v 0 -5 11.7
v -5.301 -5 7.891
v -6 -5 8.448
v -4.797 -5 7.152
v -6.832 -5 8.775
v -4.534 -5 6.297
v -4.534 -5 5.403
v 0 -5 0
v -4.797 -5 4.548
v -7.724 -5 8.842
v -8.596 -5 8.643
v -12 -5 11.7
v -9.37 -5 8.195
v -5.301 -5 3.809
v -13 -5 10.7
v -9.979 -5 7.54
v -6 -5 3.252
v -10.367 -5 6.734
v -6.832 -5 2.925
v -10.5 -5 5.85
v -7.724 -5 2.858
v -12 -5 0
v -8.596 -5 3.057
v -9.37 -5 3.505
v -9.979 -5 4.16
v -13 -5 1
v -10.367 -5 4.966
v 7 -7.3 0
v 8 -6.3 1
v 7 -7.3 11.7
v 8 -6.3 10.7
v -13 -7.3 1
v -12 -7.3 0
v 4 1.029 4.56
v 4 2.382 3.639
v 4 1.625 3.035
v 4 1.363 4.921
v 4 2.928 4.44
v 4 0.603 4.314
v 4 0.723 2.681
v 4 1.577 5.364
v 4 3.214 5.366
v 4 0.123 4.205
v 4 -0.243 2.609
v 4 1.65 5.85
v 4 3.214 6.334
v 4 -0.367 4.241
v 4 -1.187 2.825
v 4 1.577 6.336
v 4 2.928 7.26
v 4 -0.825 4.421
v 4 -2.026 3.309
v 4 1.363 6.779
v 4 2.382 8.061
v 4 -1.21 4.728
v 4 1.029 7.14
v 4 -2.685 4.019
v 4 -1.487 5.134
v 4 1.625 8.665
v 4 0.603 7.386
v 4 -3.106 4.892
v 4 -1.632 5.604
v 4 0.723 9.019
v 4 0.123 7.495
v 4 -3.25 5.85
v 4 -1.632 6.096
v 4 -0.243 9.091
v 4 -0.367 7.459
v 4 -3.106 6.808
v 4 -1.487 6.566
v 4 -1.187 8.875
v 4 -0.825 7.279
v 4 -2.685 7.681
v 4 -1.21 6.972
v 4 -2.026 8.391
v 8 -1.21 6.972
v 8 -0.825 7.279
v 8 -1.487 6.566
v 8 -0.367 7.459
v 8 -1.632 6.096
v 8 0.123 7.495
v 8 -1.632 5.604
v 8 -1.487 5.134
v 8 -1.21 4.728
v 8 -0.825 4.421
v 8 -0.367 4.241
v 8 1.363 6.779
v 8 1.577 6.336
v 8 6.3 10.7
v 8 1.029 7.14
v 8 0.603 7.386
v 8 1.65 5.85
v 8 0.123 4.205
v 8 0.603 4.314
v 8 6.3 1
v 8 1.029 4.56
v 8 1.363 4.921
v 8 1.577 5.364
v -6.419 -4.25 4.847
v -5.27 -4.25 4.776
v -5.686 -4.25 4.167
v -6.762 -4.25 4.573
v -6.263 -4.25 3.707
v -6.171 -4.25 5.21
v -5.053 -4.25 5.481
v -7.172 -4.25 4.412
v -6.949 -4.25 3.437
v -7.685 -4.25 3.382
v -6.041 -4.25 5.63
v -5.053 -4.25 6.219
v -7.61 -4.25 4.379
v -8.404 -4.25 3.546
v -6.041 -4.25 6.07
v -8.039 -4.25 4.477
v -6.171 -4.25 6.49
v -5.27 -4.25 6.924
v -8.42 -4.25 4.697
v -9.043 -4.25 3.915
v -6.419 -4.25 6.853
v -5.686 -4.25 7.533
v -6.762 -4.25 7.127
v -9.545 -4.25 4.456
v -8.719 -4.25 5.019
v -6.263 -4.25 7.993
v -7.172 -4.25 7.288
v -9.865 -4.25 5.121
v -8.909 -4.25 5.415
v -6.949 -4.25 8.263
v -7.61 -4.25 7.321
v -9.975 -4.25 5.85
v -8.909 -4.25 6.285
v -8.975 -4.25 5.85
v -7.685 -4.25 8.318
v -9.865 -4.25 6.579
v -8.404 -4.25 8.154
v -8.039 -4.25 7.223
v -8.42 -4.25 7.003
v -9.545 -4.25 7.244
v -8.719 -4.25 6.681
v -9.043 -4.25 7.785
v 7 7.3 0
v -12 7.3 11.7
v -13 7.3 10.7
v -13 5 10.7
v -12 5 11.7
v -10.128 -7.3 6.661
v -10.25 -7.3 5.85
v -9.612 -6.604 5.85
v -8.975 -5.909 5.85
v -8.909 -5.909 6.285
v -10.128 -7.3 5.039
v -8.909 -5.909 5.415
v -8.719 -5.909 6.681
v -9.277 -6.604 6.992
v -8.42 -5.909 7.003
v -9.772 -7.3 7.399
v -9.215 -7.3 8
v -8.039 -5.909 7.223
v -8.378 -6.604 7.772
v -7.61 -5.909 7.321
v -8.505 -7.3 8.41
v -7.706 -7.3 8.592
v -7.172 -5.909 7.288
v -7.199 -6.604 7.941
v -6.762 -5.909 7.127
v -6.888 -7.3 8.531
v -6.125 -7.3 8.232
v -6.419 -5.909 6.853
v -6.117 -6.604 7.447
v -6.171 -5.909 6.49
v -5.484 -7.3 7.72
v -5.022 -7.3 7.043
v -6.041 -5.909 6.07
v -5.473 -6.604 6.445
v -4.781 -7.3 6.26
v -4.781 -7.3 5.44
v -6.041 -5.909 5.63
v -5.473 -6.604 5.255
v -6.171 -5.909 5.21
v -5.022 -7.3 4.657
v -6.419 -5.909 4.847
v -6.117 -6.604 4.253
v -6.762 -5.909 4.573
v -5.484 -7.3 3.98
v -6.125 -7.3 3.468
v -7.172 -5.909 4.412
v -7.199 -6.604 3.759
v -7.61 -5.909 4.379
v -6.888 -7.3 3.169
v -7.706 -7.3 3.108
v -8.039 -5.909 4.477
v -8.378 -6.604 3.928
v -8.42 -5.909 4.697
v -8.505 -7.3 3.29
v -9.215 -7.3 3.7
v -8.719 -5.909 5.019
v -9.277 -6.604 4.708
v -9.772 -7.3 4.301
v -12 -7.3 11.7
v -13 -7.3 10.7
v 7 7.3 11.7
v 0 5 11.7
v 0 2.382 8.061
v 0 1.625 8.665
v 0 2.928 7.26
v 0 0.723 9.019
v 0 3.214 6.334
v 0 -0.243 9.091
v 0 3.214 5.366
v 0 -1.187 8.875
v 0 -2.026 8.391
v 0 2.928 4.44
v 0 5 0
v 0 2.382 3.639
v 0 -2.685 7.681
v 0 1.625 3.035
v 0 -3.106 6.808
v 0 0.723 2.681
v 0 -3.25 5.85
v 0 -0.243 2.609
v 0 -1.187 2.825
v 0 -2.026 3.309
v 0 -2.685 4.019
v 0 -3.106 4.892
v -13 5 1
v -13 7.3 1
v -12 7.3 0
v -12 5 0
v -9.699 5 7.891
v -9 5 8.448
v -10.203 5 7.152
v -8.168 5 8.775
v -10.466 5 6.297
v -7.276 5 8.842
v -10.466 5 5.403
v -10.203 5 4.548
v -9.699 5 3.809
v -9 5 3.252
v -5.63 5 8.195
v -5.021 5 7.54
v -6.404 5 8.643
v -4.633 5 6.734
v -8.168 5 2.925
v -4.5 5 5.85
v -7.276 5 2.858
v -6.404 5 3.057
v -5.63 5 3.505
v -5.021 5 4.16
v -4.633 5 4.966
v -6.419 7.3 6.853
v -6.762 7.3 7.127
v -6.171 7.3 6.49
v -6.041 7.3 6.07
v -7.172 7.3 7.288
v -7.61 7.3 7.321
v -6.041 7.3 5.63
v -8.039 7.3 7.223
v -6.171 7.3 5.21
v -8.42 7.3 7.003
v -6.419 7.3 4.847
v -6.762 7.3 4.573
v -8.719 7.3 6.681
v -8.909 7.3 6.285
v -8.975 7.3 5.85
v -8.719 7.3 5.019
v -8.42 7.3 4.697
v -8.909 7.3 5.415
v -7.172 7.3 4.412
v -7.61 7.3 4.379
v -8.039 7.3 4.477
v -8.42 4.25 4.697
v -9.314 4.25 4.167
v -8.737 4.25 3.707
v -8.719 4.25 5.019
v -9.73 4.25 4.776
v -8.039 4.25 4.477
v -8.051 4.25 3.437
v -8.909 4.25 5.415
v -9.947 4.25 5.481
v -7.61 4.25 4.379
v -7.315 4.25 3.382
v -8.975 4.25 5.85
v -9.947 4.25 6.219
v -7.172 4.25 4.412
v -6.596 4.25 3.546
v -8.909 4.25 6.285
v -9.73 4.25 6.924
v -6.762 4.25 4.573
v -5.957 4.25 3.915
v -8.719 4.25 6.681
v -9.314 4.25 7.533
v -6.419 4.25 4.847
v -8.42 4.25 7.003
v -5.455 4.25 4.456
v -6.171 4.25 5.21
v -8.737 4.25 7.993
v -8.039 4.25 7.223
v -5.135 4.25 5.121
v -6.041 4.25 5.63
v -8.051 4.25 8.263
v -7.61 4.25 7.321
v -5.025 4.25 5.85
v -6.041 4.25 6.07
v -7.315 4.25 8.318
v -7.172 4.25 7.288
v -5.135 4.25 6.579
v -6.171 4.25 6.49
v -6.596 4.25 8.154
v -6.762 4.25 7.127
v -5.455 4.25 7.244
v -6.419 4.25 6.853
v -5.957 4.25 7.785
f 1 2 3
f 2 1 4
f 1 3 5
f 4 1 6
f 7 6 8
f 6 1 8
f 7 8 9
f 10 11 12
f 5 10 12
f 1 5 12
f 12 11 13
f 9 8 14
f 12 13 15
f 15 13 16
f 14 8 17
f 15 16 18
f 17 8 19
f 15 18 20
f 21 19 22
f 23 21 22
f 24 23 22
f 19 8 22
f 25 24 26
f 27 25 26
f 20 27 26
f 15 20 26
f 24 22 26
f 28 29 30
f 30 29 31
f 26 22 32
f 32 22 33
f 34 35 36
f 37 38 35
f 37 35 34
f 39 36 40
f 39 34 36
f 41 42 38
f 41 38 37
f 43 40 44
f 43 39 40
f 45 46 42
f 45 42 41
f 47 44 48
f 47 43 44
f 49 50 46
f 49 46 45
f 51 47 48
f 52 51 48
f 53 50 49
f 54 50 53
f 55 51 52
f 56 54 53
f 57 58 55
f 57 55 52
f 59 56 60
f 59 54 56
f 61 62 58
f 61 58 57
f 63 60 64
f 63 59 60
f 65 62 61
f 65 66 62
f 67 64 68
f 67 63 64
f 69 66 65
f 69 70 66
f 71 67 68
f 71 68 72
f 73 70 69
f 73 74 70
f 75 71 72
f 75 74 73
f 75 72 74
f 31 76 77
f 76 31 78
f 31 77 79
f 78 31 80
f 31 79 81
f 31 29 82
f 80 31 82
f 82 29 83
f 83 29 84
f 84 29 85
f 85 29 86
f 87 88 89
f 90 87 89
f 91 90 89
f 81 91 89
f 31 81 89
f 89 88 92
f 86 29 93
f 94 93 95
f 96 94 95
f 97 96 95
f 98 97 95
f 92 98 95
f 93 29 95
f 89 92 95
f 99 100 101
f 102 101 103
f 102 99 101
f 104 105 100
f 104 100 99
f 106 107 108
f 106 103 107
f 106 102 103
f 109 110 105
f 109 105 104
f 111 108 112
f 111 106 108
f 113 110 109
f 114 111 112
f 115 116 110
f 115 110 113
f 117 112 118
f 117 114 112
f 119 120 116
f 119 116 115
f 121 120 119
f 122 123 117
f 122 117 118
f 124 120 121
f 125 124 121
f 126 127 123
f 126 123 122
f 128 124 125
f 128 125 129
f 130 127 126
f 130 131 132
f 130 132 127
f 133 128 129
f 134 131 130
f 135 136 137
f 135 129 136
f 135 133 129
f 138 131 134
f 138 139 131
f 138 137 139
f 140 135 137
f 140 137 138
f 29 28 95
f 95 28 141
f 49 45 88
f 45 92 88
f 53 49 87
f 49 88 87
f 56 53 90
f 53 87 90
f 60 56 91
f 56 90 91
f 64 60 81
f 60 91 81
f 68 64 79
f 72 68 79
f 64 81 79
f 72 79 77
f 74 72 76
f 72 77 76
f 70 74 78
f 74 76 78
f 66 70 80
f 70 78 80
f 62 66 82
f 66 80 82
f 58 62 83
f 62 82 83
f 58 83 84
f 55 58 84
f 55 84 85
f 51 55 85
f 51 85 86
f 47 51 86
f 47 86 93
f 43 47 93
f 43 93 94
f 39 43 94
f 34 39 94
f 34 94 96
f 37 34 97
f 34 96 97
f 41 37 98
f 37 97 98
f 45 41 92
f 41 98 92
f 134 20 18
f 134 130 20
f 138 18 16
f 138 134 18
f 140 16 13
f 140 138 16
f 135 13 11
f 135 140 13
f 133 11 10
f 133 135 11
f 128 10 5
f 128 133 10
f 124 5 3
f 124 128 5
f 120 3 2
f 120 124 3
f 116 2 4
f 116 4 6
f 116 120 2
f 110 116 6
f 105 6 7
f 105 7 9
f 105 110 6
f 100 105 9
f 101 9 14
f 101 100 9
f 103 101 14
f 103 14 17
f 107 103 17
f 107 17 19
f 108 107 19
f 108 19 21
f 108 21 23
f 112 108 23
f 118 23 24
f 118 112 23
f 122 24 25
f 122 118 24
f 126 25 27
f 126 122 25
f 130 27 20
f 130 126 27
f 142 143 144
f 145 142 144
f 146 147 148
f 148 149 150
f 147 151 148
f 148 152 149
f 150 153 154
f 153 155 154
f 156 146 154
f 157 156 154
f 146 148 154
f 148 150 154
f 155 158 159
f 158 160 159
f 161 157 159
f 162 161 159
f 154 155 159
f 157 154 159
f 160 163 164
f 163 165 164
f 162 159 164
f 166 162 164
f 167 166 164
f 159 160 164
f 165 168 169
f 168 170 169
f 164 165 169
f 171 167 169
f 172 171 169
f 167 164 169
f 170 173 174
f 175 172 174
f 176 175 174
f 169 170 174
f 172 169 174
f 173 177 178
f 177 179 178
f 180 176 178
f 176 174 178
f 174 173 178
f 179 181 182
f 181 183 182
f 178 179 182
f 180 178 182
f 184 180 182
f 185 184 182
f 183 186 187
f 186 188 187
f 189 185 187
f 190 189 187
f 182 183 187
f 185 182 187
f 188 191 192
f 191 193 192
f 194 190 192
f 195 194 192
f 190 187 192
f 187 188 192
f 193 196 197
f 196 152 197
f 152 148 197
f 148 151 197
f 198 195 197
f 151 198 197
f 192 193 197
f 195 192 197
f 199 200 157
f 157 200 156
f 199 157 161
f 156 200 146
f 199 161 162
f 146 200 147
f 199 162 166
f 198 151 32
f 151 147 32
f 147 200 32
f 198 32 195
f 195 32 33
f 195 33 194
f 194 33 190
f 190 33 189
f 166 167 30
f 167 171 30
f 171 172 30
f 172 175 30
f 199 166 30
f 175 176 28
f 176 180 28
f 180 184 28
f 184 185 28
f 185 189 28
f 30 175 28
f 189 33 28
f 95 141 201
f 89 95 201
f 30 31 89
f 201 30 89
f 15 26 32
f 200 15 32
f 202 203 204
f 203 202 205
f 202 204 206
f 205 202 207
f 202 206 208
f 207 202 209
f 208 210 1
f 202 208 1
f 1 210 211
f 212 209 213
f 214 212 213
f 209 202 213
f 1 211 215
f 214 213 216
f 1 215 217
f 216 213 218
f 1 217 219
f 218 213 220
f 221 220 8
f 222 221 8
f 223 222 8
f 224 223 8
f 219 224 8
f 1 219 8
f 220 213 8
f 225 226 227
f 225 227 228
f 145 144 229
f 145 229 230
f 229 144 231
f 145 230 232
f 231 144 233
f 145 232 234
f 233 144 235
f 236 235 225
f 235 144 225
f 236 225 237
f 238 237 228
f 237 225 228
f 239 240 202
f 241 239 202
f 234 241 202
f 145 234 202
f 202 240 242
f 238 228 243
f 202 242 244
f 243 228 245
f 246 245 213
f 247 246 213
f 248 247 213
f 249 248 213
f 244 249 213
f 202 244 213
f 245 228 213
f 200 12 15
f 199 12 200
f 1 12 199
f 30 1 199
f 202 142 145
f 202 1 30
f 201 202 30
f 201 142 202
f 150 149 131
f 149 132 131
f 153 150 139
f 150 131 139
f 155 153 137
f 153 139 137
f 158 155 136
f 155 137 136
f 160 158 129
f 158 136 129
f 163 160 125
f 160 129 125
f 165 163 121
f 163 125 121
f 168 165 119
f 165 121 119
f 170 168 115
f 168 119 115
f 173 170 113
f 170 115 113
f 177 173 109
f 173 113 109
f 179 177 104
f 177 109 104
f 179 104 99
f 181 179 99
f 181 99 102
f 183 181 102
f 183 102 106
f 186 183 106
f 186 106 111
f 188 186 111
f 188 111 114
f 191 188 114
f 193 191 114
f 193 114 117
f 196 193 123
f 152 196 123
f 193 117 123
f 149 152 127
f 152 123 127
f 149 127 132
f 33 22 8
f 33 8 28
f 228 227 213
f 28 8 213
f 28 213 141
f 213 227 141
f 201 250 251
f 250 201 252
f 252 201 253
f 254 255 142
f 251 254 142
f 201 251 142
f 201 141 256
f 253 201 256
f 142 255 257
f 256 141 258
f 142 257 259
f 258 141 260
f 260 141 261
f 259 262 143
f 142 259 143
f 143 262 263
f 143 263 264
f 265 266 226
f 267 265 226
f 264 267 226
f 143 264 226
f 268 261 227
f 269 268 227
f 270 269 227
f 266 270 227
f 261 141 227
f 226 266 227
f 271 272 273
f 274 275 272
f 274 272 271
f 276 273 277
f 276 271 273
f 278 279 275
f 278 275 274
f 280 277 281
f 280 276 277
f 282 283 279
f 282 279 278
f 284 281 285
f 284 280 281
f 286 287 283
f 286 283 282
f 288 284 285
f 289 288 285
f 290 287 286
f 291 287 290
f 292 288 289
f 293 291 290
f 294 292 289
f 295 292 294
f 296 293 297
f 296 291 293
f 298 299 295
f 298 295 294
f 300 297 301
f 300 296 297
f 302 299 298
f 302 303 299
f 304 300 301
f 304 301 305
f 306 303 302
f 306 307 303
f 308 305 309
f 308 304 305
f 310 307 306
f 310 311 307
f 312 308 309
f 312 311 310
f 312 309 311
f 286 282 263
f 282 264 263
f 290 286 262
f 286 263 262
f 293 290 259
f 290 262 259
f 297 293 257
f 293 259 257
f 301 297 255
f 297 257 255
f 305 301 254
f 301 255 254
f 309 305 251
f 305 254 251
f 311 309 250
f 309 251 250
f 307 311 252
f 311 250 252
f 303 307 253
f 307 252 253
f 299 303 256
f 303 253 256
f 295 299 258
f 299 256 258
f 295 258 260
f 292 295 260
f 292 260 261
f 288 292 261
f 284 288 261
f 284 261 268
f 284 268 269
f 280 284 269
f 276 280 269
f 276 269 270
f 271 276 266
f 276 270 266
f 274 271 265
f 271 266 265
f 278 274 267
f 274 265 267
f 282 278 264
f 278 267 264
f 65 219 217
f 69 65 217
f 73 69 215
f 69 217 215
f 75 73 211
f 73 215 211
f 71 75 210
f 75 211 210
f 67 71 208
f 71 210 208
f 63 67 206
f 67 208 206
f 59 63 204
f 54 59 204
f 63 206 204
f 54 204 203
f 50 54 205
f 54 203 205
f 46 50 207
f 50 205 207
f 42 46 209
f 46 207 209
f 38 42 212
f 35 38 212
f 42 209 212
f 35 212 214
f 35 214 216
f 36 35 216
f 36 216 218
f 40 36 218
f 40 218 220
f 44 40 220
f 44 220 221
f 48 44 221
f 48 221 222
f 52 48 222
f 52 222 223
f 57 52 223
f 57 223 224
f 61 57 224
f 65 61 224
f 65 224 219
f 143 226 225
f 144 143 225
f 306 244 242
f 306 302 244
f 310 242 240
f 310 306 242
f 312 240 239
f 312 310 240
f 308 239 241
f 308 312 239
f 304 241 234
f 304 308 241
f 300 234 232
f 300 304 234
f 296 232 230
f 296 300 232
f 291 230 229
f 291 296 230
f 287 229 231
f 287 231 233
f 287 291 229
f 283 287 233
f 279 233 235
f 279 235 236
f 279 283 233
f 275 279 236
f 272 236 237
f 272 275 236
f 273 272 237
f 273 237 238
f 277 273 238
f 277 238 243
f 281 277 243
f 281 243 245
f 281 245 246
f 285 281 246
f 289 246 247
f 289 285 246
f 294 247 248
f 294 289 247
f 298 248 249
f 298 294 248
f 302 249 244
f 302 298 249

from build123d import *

# Parameters (mm, degrees)
F1_DEPTH       = 11.7
F4_R           = 3
F6_DEPTH       = 0.75
F6_TAPER       = 35
F5_R           = 3
F7_DEPTH       = 0.75
F7_TAPER       = 35
F8_D           = 2.95
F8_CSINK_D     = 5.5
F8_CSINK_ANGLE = 85
F9_D           = 3.3
F9_CBORE_D     = 6.5
F9_CBORE_DEPTH = 4
F10_SIZE       = 1


with BuildPart() as f1:
    # F0 (on Top) → F1 (new body)
    with BuildSketch(Plane.XY):
        Polygon((-13, -7.3), (8, -7.3), (8, 0), (0, 0), (0, -5), (-13, -5), align=None)
        Polygon((0, 0), (8, 0), (8, 7.3), (-13, 7.3), (-13, 5), (0, 5), align=None)
    extrude(amount=F1_DEPTH)

    # F4 (on face) → F6 (join)
    with BuildSketch(Plane(origin=(0, -5, 0), x_dir=(-1, 0, 0), z_dir=(0, 1, 0))):
        with Locations((7.5, 5.85)):
            Circle(F4_R)
    extrude(amount=F6_DEPTH, taper=F6_TAPER)

    # F5 (on face) → F7 (join)
    with BuildSketch(Plane.XZ.offset(-5)):
        with Locations((-7.5, 5.85)):
            Circle(F5_R)
    extrude(amount=F7_DEPTH, taper=F7_TAPER)

    # F8 (through all)
    with Locations(Plane.XZ.offset(7.3)):
        with Locations((-7.5, 5.85)):
            CounterSinkHole(F8_D / 2, F8_CSINK_D / 2, counter_sink_angle=F8_CSINK_ANGLE)

    # F9 (through all)
    with Locations(Plane(origin=(0, 0, 0), x_dir=(0, -1, 0), z_dir=(-1, 0, 0))):
        with Locations((0, 5.85)):
            CounterBoreHole(F9_D / 2, F9_CBORE_D / 2, F9_CBORE_DEPTH)

    # F10
    f10_edges = [f1.edges().sort_by_distance(p)[0] for p in [
        (-13, -6.15, 11.7),
        (-13, -6.15, 0),
        (-13, 6.15, 0),
        (-13, 6.15, 11.7),
        (8, 0, 11.7),
        (8, -7.3, 5.85),
        (8, 0, 0),
        (8, 7.3, 5.85),
    ]]
    chamfer(f10_edges, length=F10_SIZE)


solid = f1.part
